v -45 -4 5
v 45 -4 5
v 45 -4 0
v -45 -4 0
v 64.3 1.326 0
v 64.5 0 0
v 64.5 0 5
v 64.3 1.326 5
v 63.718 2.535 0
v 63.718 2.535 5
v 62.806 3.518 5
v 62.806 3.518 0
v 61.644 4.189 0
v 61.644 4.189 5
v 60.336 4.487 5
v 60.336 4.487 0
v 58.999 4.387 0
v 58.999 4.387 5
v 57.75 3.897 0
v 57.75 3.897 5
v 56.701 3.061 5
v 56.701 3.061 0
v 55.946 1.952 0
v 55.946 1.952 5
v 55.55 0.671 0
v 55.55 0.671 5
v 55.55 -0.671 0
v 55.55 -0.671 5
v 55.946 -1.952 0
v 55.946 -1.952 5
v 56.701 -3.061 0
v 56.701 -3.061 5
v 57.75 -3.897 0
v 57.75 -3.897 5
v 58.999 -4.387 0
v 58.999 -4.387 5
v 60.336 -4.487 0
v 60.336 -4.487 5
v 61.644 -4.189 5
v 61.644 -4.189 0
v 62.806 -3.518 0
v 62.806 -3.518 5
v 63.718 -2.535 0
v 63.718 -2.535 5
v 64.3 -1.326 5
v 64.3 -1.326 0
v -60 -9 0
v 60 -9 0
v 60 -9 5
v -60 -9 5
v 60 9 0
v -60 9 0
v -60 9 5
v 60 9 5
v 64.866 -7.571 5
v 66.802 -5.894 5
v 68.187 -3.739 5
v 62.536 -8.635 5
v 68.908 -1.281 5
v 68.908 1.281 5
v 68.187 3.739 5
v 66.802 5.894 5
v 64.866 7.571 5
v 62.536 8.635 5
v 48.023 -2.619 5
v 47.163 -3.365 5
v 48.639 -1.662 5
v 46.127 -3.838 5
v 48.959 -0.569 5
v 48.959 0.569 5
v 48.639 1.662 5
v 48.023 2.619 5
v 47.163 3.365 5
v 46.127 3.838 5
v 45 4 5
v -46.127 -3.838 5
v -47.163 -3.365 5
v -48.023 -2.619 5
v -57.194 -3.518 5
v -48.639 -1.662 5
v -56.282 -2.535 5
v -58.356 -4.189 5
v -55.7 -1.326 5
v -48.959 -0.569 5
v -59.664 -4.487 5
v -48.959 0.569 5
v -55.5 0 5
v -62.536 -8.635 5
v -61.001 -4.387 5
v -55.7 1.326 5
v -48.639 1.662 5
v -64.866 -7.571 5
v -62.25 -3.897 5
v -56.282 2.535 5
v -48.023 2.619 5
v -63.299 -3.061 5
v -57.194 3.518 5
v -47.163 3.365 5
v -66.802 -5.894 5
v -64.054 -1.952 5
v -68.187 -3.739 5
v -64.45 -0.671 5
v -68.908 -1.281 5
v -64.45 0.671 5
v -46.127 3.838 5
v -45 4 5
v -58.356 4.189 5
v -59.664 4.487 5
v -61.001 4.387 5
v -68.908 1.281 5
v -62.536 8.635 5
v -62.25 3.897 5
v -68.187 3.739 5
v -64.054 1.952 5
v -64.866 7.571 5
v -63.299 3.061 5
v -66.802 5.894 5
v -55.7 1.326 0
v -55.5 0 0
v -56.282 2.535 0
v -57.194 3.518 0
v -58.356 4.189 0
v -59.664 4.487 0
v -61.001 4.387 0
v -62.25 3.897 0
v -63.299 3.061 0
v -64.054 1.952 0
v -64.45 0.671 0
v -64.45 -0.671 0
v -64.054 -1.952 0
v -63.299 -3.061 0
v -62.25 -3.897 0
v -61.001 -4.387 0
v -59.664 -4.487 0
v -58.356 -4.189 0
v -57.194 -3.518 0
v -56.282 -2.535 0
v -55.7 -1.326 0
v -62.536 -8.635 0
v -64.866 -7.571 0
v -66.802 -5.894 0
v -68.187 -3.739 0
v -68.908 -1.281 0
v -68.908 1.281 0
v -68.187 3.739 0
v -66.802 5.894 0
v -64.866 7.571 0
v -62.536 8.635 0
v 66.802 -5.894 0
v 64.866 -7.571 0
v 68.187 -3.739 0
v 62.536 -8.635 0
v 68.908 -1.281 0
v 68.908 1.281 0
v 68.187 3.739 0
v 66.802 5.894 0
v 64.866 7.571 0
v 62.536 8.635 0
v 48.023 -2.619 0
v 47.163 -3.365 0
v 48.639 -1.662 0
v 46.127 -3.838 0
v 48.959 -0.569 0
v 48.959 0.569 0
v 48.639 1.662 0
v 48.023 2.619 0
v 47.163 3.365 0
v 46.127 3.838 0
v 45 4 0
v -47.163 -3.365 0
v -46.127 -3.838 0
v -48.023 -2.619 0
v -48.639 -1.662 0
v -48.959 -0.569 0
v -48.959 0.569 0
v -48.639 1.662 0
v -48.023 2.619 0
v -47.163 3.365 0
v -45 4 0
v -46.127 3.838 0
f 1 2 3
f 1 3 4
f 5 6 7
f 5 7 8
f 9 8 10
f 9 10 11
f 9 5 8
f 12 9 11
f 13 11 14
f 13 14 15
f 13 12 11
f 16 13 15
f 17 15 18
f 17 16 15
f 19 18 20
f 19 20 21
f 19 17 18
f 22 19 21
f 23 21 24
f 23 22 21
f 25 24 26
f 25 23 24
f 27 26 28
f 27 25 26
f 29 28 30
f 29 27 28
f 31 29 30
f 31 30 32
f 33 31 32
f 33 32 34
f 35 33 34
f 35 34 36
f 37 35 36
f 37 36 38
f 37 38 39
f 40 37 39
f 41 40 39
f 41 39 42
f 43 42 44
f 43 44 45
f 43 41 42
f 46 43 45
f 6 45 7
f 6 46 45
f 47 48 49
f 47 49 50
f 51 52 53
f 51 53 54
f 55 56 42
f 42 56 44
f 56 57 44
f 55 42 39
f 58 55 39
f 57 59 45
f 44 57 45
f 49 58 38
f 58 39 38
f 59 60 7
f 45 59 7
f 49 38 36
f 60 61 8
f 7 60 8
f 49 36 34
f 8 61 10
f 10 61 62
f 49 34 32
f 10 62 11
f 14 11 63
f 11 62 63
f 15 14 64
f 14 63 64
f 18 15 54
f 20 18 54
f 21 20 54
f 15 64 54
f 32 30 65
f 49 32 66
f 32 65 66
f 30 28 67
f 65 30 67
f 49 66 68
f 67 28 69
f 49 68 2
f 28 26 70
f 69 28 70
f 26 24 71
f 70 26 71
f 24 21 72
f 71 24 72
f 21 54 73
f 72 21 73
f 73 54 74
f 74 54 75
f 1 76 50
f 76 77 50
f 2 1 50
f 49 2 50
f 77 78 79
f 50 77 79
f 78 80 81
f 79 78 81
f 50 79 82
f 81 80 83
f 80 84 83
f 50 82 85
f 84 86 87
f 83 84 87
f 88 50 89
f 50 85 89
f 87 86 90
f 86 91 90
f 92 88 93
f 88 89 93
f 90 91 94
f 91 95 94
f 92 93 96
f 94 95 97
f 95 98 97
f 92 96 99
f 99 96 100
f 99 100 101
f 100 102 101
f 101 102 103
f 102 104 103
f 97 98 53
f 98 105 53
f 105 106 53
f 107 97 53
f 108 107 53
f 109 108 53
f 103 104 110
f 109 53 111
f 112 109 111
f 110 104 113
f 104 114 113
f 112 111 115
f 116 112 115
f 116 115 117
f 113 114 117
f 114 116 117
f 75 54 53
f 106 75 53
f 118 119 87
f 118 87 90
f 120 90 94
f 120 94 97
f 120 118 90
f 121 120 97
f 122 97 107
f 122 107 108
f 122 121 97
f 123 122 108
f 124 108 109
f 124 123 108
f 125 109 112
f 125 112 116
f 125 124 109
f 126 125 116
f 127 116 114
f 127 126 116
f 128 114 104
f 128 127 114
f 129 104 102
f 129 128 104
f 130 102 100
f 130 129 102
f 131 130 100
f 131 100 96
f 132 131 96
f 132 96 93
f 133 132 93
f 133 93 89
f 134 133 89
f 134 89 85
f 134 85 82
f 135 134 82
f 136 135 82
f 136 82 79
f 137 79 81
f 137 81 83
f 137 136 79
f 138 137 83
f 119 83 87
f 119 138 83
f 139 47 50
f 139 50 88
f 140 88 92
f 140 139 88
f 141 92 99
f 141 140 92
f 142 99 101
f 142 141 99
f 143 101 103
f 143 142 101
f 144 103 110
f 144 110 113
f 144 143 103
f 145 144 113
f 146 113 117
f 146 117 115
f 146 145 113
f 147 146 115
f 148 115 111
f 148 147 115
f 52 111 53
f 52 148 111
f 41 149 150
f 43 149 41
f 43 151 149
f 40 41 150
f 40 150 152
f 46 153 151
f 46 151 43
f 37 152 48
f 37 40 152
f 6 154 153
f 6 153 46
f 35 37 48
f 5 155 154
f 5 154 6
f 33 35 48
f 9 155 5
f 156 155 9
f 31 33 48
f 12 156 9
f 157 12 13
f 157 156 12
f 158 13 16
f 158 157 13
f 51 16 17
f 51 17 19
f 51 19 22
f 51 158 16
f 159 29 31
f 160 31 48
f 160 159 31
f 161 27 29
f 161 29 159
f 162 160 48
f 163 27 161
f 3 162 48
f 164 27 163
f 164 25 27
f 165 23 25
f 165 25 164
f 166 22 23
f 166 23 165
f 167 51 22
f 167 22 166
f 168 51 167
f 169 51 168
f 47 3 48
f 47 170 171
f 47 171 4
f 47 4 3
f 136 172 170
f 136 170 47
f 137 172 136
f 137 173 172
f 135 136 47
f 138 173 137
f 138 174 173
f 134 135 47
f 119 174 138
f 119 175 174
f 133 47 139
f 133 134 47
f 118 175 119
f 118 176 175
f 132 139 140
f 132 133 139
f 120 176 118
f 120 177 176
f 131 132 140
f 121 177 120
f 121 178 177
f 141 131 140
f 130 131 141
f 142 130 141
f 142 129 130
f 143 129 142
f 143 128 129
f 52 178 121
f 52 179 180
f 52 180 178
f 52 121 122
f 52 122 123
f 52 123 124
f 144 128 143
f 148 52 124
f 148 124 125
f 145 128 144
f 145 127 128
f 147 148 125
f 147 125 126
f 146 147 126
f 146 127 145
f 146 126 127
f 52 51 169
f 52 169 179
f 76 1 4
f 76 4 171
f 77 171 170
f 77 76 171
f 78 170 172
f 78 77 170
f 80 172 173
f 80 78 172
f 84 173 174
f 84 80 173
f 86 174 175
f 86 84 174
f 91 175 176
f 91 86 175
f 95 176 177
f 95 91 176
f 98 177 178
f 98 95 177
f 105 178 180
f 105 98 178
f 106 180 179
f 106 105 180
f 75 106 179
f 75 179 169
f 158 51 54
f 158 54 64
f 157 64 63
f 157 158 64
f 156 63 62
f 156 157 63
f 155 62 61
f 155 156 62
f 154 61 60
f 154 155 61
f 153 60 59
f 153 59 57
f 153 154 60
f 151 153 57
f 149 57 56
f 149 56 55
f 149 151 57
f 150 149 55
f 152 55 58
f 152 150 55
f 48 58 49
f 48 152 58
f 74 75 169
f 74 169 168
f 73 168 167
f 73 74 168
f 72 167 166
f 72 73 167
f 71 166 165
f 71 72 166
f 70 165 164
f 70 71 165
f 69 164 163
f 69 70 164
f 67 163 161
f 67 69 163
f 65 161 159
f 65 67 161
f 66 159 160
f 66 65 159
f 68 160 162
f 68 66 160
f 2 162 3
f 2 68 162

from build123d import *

# Parameters (mm, degrees)
SKETCH1_R           = 4.5
BOSS_EXTRUDE1_DEPTH = 5
CUT_EXTRUDE1_DEPTH  = 10


with BuildPart() as part:
    # Sketch1 → Boss-Extrude1 (new body)
    with BuildSketch(Plane.XY):
        with BuildLine():
            Line((-60, 9), (60, 9))
            ThreePointArc((60, 9), (69, 0), (60, -9))
            Line((60, -9), (-60, -9))
            ThreePointArc((-60, -9), (-69, 0), (-60, 9))
        make_face()
        with Locations((-60, 0)):
            Circle(SKETCH1_R, mode=Mode.SUBTRACT)
        with Locations((60, 0)):
            Circle(SKETCH1_R, mode=Mode.SUBTRACT)
    extrude(amount=BOSS_EXTRUDE1_DEPTH)

    # Sketch2 → Cut-Extrude1 (cut)
    with BuildSketch(Plane.XY.offset(5)):
        with BuildLine():
            Line((-45, 4), (45, 4))
            ThreePointArc((45, 4), (49, 0), (45, -4))
            Line((45, -4), (-45, -4))
            ThreePointArc((-45, -4), (-49, 0), (-45, 4))
        make_face()
    extrude(amount=-CUT_EXTRUDE1_DEPTH, mode=Mode.SUBTRACT)


solid = part.part
